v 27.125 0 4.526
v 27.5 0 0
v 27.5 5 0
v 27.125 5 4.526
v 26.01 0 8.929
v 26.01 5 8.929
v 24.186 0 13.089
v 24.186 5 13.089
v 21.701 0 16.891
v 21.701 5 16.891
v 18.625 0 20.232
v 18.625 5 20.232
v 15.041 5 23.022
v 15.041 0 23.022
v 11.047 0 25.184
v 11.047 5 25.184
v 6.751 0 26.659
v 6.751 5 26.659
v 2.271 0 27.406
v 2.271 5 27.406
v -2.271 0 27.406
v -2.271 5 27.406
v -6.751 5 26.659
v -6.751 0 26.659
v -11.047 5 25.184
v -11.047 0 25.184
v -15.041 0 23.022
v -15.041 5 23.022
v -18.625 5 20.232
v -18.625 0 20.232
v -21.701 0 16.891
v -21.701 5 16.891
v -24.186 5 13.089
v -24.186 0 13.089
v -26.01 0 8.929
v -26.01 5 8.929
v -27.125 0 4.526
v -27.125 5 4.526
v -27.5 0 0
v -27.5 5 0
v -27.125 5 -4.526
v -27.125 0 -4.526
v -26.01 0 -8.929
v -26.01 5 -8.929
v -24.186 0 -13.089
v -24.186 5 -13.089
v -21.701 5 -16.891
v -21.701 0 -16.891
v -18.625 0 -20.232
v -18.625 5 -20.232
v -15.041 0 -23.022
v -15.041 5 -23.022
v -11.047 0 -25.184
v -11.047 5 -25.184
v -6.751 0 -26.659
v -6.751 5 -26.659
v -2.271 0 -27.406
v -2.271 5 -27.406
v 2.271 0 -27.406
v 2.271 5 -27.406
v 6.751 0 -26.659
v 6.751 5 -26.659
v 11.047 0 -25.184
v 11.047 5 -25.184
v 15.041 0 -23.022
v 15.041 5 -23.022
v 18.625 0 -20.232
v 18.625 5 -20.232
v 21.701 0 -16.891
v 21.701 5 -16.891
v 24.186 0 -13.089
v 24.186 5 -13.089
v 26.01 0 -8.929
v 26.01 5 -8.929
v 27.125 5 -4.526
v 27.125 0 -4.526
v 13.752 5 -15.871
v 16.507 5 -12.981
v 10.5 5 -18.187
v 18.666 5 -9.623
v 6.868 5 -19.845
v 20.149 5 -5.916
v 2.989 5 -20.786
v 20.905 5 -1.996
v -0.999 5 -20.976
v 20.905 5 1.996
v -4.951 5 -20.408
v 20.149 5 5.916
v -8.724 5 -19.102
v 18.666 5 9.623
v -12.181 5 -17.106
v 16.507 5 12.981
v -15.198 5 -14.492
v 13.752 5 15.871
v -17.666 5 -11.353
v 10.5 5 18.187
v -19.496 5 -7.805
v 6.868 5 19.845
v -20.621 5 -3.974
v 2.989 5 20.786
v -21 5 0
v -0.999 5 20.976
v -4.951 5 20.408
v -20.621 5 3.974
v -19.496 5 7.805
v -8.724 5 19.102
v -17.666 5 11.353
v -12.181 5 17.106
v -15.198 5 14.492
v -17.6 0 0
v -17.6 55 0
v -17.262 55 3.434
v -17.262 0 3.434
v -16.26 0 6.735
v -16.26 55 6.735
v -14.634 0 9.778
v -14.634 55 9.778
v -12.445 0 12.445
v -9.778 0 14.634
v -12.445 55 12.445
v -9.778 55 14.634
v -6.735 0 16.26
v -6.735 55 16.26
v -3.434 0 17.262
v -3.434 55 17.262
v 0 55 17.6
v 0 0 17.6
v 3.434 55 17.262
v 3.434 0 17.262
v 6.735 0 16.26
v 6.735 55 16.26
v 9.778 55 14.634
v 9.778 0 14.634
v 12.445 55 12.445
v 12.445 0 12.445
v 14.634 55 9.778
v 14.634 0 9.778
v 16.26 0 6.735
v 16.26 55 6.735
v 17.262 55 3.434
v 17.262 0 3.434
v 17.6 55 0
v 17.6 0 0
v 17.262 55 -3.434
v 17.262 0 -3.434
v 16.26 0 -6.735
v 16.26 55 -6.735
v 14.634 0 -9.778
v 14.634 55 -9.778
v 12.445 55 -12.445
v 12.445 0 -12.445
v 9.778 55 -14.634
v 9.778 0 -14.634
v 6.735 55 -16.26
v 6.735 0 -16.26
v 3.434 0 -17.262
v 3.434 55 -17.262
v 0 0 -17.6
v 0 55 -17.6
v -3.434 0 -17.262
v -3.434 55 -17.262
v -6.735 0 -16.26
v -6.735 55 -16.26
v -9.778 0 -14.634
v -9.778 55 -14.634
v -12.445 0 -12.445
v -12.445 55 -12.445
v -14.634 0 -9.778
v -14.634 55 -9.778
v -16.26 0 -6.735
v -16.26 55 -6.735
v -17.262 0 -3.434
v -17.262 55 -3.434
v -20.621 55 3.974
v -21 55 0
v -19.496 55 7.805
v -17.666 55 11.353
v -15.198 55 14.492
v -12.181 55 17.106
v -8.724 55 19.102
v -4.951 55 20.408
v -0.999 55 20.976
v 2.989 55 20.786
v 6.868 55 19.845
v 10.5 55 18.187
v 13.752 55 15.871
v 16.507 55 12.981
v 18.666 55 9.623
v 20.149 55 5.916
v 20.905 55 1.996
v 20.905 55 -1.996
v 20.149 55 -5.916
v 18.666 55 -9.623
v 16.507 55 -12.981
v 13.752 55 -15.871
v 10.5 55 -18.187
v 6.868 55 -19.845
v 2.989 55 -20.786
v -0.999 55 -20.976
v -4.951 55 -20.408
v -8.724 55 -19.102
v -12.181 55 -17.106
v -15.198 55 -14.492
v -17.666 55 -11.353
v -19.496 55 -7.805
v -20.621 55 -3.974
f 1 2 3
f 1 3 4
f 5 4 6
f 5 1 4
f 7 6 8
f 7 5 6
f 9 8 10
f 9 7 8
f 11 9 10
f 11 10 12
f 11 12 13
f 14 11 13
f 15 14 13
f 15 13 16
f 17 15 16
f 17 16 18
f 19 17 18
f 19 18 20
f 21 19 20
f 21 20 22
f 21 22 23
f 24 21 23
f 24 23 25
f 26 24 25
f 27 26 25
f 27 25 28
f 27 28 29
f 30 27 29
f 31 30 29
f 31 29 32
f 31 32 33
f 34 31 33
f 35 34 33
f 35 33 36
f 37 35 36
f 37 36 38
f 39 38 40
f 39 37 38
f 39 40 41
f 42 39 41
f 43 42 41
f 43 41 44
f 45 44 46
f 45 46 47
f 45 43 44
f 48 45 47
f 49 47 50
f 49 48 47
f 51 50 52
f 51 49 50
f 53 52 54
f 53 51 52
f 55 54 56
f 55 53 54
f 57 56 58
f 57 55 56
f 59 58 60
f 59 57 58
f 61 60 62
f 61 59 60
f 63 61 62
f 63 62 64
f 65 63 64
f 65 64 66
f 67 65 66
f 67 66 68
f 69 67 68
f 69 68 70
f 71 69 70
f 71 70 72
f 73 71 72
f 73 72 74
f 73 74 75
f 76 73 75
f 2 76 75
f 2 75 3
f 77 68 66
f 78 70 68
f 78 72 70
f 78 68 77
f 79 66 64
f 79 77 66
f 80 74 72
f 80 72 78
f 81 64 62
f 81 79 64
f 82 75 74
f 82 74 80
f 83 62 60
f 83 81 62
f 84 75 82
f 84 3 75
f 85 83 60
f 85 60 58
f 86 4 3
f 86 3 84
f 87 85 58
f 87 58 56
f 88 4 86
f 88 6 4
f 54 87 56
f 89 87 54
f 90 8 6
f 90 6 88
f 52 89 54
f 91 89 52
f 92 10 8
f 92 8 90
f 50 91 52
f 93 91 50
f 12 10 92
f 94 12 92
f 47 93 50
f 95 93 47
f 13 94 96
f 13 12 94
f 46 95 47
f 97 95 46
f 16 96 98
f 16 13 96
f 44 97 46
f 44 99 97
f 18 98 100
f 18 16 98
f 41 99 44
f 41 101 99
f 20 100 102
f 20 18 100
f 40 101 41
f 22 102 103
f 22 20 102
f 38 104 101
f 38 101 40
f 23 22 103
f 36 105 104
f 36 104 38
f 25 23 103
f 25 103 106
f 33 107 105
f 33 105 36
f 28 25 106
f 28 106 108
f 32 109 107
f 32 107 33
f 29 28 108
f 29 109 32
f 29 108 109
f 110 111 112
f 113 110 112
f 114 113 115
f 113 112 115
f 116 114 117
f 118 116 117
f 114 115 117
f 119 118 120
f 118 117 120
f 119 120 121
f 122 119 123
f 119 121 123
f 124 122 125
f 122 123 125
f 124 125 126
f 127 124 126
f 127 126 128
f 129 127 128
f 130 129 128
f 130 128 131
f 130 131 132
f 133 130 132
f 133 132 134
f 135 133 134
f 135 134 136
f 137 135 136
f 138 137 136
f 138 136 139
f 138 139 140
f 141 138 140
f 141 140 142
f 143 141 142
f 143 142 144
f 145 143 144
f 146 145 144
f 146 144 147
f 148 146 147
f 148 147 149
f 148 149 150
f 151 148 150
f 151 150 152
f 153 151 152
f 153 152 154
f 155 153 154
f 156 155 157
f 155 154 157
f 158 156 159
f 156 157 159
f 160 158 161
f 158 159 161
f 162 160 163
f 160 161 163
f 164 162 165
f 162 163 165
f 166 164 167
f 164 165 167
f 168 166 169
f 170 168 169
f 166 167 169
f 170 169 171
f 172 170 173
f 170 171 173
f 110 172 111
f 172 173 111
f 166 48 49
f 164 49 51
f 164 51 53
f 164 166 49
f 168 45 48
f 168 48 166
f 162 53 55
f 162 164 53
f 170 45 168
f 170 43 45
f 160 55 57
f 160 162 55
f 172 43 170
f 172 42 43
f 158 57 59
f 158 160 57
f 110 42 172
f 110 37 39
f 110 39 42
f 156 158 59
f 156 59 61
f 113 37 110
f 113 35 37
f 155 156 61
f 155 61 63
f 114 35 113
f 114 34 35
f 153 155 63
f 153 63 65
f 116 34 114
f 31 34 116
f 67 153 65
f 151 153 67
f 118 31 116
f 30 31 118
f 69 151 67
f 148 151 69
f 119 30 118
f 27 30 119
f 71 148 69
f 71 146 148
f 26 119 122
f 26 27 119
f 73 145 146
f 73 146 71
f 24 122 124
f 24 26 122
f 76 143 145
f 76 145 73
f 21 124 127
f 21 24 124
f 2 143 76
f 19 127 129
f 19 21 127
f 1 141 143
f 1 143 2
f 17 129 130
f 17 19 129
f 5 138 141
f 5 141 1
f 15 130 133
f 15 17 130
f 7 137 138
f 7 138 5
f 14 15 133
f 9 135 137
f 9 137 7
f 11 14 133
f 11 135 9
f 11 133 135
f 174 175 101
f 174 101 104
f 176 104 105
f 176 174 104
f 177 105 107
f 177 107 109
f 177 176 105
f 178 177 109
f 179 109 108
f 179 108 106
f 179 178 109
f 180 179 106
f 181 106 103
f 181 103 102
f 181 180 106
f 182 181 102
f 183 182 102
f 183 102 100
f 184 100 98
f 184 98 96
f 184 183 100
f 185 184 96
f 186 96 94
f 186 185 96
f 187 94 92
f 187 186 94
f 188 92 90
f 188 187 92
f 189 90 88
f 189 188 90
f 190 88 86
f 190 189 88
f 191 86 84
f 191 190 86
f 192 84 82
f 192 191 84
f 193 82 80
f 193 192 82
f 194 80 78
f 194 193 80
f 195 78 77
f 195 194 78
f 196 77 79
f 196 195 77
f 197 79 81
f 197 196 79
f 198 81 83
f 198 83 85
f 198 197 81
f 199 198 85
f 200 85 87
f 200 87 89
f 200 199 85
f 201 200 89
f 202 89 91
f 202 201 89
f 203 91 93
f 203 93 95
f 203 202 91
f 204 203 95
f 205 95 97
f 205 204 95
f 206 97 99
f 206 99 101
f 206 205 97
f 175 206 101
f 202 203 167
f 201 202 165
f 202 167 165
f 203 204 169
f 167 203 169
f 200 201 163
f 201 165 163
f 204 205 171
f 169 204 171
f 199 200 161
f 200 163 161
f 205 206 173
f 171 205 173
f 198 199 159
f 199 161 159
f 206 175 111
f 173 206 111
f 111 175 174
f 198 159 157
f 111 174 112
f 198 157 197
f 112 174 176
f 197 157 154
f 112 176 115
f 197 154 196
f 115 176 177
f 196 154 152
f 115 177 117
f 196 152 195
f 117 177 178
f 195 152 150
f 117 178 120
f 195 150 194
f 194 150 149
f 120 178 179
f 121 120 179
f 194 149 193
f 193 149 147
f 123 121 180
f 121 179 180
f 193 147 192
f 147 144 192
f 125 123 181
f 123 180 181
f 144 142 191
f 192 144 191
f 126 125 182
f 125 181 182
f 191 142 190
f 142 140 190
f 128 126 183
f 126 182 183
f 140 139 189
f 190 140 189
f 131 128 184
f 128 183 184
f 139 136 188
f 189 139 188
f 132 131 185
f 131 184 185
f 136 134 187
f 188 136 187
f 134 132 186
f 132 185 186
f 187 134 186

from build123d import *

# Parameters (mm, degrees)
F0_R     = 27.5
F1_DEPTH = 55
F2_R     = 27.5
F2_R_2   = 21
F3_DEPTH = 50
F5_D     = 35.2


with BuildPart() as f1:
    # F0 (on Front) → F1 (new body)
    with BuildSketch(Plane.XZ):
        Circle(F0_R)
    extrude(amount=-F1_DEPTH)

    # F2 (on face) → F3 (cut)
    with BuildSketch(Plane(origin=(0, 55, 0), x_dir=(-1, 0, 0), z_dir=(0, 1, 0))):
        Circle(F2_R)
        Circle(F2_R_2, mode=Mode.SUBTRACT)
    extrude(amount=-F3_DEPTH, mode=Mode.SUBTRACT)

    # F5 (through all)
    with Locations(Plane.XZ):
        with Locations((0, 0)):
            Hole(F5_D / 2)


solid = f1.part
